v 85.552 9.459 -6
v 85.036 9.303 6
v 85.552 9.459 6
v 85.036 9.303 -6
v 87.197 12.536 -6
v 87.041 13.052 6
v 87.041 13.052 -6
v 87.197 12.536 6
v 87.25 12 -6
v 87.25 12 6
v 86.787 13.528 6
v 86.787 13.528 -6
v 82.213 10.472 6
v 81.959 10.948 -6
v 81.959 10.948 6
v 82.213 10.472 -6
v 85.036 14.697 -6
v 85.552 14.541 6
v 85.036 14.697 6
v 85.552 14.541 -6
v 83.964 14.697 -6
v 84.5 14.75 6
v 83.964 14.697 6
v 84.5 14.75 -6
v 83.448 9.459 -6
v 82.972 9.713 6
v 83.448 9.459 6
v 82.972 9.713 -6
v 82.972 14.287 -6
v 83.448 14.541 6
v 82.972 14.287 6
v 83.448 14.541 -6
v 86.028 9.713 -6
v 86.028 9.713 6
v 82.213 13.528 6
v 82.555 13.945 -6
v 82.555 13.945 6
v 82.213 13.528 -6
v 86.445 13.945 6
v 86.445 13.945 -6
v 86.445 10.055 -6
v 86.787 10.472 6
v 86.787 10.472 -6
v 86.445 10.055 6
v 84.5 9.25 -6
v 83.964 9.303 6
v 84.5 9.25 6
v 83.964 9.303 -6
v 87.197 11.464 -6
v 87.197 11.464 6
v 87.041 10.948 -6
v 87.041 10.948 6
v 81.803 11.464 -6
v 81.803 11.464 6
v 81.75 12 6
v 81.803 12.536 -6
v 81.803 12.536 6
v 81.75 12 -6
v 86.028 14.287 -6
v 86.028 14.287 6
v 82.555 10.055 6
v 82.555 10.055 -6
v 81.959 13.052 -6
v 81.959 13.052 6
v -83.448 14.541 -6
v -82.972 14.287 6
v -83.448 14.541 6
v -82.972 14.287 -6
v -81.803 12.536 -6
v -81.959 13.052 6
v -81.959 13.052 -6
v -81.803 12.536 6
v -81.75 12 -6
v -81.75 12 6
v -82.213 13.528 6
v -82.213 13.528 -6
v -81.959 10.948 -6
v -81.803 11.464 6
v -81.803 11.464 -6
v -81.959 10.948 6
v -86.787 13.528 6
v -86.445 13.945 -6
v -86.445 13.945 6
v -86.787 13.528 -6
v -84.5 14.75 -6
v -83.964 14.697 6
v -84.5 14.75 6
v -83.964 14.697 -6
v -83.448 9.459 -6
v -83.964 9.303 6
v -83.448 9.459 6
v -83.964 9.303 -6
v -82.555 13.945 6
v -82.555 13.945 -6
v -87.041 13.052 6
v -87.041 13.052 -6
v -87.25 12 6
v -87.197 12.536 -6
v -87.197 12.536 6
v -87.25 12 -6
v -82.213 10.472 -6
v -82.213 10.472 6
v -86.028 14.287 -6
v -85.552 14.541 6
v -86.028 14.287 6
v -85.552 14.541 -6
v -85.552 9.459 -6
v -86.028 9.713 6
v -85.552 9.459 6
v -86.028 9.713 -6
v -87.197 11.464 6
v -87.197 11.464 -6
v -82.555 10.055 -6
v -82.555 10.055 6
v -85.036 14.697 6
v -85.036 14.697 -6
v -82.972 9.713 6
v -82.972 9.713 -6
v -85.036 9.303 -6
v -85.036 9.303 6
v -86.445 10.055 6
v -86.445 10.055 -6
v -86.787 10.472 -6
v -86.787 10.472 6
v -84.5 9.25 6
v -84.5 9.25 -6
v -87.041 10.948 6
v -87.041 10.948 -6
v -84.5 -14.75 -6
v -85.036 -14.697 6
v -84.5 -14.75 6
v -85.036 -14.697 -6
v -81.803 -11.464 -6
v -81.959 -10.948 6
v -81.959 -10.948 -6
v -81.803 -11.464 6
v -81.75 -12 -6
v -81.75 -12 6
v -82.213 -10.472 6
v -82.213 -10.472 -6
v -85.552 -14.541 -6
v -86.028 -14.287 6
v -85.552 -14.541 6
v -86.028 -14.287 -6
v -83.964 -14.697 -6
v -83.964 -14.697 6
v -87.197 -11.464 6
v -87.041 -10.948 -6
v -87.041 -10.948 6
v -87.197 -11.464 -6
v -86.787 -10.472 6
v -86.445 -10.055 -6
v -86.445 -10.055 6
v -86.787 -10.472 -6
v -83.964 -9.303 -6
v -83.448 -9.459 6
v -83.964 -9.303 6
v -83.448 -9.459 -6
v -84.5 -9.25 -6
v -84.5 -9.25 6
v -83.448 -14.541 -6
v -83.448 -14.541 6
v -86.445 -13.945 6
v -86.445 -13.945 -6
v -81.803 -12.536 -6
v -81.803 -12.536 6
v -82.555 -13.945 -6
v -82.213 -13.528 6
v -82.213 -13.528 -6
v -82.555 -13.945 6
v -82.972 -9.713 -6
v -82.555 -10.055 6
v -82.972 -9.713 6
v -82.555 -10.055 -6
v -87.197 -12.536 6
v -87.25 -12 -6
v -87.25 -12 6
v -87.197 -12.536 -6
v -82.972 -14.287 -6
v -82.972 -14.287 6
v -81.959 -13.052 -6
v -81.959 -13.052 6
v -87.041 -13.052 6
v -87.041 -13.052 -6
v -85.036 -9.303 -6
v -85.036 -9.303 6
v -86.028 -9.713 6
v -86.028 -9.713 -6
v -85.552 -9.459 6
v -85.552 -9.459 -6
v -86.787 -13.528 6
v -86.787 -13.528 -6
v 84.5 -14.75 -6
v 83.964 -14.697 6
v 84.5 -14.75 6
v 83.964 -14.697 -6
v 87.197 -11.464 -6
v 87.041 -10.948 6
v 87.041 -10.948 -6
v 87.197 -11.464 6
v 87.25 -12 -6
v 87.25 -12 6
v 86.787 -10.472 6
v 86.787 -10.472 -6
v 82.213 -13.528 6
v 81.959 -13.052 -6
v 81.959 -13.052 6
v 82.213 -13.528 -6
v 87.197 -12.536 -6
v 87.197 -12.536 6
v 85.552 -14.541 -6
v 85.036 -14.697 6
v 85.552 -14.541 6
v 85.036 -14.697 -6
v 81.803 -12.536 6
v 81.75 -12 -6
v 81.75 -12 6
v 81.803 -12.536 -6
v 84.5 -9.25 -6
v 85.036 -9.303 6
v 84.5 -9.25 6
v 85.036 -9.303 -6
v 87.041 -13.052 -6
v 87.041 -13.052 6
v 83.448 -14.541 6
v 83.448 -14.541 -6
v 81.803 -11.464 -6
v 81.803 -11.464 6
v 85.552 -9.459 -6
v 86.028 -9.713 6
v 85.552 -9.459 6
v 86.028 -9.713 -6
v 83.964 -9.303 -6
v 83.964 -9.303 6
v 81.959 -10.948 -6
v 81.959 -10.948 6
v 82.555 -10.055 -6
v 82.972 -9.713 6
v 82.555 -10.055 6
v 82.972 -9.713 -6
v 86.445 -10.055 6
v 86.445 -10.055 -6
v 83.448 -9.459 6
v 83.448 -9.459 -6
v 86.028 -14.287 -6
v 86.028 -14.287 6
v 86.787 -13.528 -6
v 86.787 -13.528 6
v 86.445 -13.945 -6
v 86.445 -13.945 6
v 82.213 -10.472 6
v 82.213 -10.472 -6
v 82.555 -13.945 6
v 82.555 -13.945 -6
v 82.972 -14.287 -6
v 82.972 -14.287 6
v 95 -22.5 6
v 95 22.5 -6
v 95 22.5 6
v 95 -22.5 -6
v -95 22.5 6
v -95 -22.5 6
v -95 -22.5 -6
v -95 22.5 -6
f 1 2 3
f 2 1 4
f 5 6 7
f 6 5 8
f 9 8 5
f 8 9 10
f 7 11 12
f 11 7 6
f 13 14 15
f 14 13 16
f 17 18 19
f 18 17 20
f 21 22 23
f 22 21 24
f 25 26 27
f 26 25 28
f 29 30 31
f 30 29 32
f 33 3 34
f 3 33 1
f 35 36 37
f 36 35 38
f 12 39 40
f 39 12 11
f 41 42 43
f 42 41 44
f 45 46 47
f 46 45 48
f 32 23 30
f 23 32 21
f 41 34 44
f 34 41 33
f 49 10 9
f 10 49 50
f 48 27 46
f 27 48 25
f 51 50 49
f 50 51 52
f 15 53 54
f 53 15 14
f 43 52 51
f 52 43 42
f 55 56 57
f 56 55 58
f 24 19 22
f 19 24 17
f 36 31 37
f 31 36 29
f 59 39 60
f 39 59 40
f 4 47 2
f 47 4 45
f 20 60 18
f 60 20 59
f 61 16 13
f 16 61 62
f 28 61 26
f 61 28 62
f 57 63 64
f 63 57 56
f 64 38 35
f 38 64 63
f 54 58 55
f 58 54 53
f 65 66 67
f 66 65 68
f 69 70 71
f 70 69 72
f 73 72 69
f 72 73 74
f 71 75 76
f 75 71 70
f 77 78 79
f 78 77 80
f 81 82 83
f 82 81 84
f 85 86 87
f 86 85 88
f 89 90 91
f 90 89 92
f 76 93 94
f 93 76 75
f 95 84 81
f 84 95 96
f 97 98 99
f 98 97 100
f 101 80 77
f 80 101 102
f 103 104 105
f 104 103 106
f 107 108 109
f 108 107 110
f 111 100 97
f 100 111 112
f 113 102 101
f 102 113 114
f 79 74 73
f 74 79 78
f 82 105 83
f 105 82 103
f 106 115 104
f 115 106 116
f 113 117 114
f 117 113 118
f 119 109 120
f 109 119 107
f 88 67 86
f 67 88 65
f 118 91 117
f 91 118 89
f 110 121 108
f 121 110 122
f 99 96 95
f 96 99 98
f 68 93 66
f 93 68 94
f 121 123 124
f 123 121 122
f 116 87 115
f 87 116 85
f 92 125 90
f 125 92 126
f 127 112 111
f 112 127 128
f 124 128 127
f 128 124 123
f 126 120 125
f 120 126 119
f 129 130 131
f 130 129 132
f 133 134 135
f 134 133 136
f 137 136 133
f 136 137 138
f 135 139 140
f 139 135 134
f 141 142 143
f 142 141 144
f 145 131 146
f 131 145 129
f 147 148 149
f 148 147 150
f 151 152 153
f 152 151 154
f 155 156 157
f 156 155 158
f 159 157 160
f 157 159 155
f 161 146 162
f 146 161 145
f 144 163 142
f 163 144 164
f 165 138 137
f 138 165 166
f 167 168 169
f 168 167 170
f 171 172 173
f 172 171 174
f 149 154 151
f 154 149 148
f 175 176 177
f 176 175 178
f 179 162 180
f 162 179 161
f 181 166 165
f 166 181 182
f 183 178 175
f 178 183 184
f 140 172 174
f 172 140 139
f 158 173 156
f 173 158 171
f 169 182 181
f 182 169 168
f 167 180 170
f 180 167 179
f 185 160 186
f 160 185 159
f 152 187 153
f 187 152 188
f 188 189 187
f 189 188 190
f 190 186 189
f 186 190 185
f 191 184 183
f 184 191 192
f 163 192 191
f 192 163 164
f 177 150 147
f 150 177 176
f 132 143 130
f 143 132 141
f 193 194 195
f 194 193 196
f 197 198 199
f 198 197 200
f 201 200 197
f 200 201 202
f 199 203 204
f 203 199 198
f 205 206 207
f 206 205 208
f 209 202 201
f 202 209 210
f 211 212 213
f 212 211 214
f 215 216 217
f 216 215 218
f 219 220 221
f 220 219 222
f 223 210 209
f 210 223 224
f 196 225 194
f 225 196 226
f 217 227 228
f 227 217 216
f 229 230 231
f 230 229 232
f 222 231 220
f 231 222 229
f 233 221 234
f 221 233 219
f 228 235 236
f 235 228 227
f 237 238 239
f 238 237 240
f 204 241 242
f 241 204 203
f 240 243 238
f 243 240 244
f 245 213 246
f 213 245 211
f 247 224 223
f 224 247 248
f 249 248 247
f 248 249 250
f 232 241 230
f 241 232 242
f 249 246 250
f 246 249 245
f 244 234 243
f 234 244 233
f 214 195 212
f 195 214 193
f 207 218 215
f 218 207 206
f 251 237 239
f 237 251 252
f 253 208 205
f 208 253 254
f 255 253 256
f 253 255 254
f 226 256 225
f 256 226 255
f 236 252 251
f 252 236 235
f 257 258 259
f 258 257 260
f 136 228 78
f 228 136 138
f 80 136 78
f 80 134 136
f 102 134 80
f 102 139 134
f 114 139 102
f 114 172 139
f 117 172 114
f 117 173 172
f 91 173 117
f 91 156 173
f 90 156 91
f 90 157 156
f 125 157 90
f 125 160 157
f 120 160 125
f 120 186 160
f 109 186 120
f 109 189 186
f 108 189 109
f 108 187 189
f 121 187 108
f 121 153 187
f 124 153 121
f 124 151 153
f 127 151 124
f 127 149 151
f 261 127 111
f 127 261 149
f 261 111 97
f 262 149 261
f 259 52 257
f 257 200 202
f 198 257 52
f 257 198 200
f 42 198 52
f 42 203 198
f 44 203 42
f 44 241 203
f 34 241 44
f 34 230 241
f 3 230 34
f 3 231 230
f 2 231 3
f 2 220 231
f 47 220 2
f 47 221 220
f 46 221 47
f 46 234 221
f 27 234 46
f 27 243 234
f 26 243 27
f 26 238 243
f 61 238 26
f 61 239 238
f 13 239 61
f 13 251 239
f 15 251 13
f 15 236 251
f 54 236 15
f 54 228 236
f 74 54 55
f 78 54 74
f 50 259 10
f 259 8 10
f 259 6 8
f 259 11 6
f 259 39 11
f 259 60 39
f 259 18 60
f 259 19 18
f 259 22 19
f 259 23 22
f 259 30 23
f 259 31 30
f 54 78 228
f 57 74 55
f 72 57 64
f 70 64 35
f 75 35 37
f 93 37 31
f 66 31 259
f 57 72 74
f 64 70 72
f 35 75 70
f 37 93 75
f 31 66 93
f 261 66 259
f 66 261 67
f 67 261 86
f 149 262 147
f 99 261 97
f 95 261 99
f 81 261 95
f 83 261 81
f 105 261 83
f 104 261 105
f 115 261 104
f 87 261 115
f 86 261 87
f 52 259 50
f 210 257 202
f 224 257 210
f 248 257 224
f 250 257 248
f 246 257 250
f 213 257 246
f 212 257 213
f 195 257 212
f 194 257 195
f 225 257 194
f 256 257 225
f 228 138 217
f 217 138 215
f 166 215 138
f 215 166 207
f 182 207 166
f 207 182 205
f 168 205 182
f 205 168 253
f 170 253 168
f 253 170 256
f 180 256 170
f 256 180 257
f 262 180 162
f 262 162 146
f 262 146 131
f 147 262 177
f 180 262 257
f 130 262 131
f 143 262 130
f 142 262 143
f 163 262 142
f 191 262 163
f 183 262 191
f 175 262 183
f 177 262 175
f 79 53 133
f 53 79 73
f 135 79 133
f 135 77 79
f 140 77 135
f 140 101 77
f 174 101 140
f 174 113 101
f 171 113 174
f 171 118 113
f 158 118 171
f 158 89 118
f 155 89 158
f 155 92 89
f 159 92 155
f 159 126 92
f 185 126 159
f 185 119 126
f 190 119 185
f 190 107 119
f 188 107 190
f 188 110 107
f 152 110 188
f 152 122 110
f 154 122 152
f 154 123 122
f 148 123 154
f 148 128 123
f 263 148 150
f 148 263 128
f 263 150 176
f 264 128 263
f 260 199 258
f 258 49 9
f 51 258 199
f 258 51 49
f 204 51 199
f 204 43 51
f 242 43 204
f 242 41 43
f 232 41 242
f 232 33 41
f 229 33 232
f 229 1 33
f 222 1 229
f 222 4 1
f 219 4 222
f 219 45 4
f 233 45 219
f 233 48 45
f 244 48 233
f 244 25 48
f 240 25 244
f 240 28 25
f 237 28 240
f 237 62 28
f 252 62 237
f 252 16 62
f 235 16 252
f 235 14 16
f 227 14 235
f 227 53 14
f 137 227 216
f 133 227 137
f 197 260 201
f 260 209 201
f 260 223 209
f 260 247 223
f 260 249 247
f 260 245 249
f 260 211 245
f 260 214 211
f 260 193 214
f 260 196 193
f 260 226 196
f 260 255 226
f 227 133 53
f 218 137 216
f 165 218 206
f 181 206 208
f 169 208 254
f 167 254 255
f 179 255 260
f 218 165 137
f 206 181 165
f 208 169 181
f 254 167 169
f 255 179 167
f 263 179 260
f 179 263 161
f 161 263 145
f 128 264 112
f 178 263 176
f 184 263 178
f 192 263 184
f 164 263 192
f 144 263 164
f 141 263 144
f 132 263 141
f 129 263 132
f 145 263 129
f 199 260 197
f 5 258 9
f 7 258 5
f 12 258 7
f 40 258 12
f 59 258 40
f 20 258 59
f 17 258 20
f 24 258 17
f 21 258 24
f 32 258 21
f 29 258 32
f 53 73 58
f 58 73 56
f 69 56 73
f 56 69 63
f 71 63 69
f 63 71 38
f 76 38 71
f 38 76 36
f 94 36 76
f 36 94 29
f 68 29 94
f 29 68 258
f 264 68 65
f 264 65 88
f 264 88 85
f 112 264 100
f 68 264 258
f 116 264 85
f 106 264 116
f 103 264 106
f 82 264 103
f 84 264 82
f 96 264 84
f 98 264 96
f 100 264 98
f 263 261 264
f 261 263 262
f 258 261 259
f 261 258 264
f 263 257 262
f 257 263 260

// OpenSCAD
$fn = 32;

// ----------------------------------------------------------------------
// Corner plate 190 x 45 x 12
// 4 holes, centres taken from the edge offset
// ----------------------------------------------------------------------

// --- parameters (mm) ---
plate = [190, 45, 12];  // overall size (x, y, z)
holes = 4;              // number of holes the drawing asks for
hole_d = 5.5;           // hole diameter
edge = 10.5;            // hole centre offset from the plate edge

// --- derived feature positions (mm) ---
corner_x = plate[0] / 2 - edge;  // = 84.5   corner hole X
corner_y = plate[1] / 2 - edge;  // = 12   corner hole Y
feature_centers = [
  [corner_x, corner_y],
  [-corner_x, corner_y],
  [-corner_x, -corner_y],
  [corner_x, -corner_y]
];   // hole centres the loop below drills

// plate outline, every hole drilled through with the same cutters
difference() {
  cube(plate, center = true);
  for (centre = feature_centers)
    translate([centre[0], centre[1], 0])
      cylinder(d = hole_d, h = plate[2] + 2, center = true);
}
